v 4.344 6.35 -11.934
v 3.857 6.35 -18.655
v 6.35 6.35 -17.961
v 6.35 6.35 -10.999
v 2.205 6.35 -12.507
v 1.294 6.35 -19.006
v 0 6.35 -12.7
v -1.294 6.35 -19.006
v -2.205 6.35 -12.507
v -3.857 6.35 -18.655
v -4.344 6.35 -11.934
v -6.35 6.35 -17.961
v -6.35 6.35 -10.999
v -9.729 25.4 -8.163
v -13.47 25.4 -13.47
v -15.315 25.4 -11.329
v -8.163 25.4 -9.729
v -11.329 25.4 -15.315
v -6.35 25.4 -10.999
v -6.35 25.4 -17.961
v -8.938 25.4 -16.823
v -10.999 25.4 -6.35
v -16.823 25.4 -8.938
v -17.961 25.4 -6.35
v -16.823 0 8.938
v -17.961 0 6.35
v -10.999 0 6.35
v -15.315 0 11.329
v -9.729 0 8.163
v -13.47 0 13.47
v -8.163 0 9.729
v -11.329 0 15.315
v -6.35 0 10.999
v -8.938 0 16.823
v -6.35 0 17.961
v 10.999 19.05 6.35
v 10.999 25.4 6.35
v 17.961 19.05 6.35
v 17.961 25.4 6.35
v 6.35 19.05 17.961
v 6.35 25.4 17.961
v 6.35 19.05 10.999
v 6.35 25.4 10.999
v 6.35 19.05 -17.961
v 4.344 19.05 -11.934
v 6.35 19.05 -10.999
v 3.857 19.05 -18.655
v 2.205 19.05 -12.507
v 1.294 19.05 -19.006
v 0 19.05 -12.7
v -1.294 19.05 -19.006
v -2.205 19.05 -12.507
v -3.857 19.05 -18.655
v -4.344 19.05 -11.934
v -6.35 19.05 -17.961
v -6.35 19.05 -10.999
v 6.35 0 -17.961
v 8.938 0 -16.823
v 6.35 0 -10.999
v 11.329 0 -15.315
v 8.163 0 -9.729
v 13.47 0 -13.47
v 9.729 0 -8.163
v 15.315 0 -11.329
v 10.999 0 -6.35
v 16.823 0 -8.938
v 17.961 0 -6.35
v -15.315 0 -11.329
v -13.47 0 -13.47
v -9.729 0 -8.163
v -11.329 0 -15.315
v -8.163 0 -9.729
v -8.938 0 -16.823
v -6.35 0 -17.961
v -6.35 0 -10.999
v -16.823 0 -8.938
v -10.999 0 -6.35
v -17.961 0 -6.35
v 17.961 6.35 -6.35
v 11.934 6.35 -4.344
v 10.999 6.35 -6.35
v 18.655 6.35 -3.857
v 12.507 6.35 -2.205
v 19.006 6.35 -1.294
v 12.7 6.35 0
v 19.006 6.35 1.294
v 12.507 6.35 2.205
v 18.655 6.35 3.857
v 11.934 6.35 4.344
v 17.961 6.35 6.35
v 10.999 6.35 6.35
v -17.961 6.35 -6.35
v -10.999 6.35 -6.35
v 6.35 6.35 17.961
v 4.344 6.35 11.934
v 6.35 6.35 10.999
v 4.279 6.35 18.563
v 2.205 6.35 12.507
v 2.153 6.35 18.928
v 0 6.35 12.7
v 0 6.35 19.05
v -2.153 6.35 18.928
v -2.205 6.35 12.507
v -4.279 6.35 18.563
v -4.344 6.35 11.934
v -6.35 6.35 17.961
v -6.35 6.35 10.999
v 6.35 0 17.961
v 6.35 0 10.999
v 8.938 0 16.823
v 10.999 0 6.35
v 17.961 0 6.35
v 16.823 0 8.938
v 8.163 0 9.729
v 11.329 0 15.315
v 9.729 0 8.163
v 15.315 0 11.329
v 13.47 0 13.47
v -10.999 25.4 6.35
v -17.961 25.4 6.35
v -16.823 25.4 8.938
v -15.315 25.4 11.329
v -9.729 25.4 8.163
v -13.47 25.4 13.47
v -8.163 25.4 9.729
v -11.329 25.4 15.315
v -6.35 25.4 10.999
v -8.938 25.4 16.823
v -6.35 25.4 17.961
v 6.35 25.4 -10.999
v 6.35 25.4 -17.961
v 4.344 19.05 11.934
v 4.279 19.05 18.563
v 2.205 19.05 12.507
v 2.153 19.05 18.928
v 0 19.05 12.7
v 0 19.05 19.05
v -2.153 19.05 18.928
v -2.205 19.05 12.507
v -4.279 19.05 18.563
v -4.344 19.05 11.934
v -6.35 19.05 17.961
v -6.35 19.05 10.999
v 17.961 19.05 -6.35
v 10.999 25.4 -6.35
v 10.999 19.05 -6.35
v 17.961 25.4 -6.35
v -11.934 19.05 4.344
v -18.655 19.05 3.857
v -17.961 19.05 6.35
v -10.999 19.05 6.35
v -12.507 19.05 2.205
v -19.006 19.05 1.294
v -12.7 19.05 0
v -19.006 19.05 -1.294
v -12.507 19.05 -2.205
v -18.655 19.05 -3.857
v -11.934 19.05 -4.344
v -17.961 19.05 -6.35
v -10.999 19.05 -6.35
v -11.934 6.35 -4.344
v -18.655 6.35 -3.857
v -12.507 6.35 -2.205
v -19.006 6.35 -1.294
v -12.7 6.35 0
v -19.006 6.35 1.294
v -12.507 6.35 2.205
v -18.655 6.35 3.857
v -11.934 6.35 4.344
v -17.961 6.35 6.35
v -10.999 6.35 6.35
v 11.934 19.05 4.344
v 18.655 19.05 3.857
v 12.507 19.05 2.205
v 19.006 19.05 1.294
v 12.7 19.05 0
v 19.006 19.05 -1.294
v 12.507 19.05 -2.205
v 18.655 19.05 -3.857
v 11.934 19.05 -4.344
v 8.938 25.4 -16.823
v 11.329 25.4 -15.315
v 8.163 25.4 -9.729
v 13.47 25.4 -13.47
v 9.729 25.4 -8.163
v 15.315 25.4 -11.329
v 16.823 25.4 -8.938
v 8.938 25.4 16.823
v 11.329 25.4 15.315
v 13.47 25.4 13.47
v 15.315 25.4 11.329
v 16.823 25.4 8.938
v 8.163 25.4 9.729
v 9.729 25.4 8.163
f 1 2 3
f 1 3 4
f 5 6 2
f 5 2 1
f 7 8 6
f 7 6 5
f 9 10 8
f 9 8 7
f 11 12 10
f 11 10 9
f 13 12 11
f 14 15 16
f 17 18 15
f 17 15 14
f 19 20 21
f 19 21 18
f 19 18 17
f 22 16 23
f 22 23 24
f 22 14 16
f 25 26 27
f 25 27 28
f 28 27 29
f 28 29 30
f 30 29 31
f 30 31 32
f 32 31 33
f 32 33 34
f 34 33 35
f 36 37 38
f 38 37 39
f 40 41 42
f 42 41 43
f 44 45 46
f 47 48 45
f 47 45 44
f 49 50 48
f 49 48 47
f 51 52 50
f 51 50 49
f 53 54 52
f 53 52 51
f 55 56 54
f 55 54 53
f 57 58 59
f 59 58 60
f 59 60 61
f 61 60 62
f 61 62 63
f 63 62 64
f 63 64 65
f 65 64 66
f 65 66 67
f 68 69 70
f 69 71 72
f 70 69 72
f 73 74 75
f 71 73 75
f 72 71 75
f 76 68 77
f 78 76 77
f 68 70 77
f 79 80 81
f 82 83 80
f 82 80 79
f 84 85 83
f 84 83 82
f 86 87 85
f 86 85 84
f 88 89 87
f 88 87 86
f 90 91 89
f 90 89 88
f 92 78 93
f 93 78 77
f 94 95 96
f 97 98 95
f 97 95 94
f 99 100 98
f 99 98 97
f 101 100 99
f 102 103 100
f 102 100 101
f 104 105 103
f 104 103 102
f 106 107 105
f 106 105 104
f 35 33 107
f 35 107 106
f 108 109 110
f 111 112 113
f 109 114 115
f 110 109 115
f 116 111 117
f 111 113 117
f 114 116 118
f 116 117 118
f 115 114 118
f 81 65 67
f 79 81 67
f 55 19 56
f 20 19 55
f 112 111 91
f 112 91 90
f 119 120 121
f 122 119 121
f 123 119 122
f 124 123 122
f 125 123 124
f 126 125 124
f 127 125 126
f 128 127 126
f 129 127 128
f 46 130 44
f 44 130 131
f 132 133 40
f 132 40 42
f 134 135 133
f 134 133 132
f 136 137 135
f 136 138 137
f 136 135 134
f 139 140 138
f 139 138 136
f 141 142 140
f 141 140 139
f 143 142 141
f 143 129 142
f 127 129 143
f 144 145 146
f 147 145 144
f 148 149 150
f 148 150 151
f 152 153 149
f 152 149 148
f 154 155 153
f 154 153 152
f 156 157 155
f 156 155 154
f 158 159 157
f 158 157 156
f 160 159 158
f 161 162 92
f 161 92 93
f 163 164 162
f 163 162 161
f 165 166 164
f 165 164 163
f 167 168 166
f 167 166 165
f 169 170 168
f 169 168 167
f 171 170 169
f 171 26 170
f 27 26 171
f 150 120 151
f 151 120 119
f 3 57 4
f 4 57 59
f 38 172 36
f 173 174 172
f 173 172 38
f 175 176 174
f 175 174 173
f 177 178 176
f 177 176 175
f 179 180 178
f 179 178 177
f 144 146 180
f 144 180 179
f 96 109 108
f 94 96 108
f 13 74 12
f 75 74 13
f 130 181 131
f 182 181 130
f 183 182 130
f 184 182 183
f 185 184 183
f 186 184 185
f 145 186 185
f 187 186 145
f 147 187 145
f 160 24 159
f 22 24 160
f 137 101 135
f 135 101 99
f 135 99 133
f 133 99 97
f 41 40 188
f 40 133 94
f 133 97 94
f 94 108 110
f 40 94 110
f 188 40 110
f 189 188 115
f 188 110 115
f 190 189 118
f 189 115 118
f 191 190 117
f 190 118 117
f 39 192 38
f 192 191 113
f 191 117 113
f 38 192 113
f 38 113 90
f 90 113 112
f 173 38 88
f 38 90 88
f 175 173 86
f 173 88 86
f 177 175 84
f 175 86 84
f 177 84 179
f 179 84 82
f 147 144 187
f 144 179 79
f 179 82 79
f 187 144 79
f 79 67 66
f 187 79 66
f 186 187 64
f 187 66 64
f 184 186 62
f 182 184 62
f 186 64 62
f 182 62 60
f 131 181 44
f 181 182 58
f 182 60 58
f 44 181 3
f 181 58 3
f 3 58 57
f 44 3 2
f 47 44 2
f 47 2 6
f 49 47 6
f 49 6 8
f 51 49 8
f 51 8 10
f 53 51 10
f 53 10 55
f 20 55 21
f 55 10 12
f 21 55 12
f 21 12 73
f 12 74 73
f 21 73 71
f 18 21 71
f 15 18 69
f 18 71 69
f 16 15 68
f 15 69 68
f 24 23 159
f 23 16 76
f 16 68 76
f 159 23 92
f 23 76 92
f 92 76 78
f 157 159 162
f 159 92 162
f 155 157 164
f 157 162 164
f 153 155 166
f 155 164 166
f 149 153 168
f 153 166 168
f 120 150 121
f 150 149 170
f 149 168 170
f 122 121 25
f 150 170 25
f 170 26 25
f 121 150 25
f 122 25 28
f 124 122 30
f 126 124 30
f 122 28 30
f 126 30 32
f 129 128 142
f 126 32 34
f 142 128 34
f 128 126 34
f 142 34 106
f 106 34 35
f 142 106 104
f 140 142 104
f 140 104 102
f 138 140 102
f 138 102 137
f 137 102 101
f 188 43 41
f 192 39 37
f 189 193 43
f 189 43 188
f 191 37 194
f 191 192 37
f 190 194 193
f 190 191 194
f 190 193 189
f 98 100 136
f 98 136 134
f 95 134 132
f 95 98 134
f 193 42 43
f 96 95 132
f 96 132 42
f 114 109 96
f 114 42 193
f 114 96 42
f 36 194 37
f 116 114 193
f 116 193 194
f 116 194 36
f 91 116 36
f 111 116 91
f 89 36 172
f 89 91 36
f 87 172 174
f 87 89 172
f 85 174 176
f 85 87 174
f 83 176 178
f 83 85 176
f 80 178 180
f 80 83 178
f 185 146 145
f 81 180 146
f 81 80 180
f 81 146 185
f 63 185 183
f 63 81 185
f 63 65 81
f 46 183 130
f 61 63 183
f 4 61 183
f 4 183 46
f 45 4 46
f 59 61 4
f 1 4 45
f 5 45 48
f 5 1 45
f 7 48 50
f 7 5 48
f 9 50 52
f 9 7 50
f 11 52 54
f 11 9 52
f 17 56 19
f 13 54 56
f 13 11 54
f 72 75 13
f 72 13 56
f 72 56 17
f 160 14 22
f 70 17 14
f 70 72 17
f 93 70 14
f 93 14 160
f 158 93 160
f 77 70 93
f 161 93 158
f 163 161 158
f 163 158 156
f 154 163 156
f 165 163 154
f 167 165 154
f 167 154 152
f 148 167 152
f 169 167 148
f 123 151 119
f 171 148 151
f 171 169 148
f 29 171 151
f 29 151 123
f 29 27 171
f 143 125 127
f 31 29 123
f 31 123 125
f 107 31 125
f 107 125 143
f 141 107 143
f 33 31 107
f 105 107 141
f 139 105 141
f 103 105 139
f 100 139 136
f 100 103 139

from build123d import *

# Parameters (mm, degrees)
SKETCH2_R           = 19.05
SKETCH2_R_2         = 12.7
BOSS_EXTRUDE2_DEPTH = 25.4
SKETCH4_W           = 76.2
SKETCH4_H           = 12.7
CUT_EXTRUDE7_DEPTH  = 6.35
CIRPATTERN1_COUNT   = 2
CIRPATTERN1_ANGLE   = 90
SKETCH8_W           = 78.396046772
SKETCH8_H           = 12.7
CUT_EXTRUDE9_DEPTH  = 6.35
CIRPATTERN2_COUNT   = 2
CIRPATTERN2_ANGLE   = 90


with BuildPart() as part:
    # Sketch2 → Boss-Extrude2 (new body)
    with BuildSketch(Plane(origin=(0, 0, 0), x_dir=(1, 0, 0), z_dir=(0, 1, 0))):
        with Locations(Location((0, 0, 0), (0, 0, 270))):
            Circle(SKETCH2_R)
        with Locations(Location((0, 0, 0), (0, 0, 270))):
            Circle(SKETCH2_R_2, mode=Mode.SUBTRACT)
    extrude(amount=BOSS_EXTRUDE2_DEPTH)

    # Sketch4 → Cut-Extrude7 (cut)
    with BuildSketch(Plane(origin=(0, 25.4, 0), x_dir=(1, 0, 0), z_dir=(0, 1, 0))):
        Rectangle(SKETCH4_W, SKETCH4_H)
    cut_extrude7 = extrude(amount=-CUT_EXTRUDE7_DEPTH, mode=Mode.SUBTRACT)

    # CirPattern1: Cut-Extrude7 ×2 about axis
    cirpattern1_axis = Axis((0, 25.4, 0), (0, 1, 0))
    for i in range(1, CIRPATTERN1_COUNT):
        add(cut_extrude7.rotate(cirpattern1_axis, i * CIRPATTERN1_ANGLE / (CIRPATTERN1_COUNT - 1)), mode=Mode.SUBTRACT)

    # Sketch8 → Cut-Extrude9 (cut)
    with BuildSketch(Plane.XZ):
        Rectangle(SKETCH8_W, SKETCH8_H)
    cut_extrude9 = extrude(amount=-CUT_EXTRUDE9_DEPTH, mode=Mode.SUBTRACT)

    # CirPattern2: Cut-Extrude9 ×2 about axis
    cirpattern2_axis = Axis((0, 25.4, 0), (0, -1, 0))
    for i in range(1, CIRPATTERN2_COUNT):
        add(cut_extrude9.rotate(cirpattern2_axis, i * CIRPATTERN2_ANGLE / (CIRPATTERN2_COUNT - 1)), mode=Mode.SUBTRACT)


solid = part.part
